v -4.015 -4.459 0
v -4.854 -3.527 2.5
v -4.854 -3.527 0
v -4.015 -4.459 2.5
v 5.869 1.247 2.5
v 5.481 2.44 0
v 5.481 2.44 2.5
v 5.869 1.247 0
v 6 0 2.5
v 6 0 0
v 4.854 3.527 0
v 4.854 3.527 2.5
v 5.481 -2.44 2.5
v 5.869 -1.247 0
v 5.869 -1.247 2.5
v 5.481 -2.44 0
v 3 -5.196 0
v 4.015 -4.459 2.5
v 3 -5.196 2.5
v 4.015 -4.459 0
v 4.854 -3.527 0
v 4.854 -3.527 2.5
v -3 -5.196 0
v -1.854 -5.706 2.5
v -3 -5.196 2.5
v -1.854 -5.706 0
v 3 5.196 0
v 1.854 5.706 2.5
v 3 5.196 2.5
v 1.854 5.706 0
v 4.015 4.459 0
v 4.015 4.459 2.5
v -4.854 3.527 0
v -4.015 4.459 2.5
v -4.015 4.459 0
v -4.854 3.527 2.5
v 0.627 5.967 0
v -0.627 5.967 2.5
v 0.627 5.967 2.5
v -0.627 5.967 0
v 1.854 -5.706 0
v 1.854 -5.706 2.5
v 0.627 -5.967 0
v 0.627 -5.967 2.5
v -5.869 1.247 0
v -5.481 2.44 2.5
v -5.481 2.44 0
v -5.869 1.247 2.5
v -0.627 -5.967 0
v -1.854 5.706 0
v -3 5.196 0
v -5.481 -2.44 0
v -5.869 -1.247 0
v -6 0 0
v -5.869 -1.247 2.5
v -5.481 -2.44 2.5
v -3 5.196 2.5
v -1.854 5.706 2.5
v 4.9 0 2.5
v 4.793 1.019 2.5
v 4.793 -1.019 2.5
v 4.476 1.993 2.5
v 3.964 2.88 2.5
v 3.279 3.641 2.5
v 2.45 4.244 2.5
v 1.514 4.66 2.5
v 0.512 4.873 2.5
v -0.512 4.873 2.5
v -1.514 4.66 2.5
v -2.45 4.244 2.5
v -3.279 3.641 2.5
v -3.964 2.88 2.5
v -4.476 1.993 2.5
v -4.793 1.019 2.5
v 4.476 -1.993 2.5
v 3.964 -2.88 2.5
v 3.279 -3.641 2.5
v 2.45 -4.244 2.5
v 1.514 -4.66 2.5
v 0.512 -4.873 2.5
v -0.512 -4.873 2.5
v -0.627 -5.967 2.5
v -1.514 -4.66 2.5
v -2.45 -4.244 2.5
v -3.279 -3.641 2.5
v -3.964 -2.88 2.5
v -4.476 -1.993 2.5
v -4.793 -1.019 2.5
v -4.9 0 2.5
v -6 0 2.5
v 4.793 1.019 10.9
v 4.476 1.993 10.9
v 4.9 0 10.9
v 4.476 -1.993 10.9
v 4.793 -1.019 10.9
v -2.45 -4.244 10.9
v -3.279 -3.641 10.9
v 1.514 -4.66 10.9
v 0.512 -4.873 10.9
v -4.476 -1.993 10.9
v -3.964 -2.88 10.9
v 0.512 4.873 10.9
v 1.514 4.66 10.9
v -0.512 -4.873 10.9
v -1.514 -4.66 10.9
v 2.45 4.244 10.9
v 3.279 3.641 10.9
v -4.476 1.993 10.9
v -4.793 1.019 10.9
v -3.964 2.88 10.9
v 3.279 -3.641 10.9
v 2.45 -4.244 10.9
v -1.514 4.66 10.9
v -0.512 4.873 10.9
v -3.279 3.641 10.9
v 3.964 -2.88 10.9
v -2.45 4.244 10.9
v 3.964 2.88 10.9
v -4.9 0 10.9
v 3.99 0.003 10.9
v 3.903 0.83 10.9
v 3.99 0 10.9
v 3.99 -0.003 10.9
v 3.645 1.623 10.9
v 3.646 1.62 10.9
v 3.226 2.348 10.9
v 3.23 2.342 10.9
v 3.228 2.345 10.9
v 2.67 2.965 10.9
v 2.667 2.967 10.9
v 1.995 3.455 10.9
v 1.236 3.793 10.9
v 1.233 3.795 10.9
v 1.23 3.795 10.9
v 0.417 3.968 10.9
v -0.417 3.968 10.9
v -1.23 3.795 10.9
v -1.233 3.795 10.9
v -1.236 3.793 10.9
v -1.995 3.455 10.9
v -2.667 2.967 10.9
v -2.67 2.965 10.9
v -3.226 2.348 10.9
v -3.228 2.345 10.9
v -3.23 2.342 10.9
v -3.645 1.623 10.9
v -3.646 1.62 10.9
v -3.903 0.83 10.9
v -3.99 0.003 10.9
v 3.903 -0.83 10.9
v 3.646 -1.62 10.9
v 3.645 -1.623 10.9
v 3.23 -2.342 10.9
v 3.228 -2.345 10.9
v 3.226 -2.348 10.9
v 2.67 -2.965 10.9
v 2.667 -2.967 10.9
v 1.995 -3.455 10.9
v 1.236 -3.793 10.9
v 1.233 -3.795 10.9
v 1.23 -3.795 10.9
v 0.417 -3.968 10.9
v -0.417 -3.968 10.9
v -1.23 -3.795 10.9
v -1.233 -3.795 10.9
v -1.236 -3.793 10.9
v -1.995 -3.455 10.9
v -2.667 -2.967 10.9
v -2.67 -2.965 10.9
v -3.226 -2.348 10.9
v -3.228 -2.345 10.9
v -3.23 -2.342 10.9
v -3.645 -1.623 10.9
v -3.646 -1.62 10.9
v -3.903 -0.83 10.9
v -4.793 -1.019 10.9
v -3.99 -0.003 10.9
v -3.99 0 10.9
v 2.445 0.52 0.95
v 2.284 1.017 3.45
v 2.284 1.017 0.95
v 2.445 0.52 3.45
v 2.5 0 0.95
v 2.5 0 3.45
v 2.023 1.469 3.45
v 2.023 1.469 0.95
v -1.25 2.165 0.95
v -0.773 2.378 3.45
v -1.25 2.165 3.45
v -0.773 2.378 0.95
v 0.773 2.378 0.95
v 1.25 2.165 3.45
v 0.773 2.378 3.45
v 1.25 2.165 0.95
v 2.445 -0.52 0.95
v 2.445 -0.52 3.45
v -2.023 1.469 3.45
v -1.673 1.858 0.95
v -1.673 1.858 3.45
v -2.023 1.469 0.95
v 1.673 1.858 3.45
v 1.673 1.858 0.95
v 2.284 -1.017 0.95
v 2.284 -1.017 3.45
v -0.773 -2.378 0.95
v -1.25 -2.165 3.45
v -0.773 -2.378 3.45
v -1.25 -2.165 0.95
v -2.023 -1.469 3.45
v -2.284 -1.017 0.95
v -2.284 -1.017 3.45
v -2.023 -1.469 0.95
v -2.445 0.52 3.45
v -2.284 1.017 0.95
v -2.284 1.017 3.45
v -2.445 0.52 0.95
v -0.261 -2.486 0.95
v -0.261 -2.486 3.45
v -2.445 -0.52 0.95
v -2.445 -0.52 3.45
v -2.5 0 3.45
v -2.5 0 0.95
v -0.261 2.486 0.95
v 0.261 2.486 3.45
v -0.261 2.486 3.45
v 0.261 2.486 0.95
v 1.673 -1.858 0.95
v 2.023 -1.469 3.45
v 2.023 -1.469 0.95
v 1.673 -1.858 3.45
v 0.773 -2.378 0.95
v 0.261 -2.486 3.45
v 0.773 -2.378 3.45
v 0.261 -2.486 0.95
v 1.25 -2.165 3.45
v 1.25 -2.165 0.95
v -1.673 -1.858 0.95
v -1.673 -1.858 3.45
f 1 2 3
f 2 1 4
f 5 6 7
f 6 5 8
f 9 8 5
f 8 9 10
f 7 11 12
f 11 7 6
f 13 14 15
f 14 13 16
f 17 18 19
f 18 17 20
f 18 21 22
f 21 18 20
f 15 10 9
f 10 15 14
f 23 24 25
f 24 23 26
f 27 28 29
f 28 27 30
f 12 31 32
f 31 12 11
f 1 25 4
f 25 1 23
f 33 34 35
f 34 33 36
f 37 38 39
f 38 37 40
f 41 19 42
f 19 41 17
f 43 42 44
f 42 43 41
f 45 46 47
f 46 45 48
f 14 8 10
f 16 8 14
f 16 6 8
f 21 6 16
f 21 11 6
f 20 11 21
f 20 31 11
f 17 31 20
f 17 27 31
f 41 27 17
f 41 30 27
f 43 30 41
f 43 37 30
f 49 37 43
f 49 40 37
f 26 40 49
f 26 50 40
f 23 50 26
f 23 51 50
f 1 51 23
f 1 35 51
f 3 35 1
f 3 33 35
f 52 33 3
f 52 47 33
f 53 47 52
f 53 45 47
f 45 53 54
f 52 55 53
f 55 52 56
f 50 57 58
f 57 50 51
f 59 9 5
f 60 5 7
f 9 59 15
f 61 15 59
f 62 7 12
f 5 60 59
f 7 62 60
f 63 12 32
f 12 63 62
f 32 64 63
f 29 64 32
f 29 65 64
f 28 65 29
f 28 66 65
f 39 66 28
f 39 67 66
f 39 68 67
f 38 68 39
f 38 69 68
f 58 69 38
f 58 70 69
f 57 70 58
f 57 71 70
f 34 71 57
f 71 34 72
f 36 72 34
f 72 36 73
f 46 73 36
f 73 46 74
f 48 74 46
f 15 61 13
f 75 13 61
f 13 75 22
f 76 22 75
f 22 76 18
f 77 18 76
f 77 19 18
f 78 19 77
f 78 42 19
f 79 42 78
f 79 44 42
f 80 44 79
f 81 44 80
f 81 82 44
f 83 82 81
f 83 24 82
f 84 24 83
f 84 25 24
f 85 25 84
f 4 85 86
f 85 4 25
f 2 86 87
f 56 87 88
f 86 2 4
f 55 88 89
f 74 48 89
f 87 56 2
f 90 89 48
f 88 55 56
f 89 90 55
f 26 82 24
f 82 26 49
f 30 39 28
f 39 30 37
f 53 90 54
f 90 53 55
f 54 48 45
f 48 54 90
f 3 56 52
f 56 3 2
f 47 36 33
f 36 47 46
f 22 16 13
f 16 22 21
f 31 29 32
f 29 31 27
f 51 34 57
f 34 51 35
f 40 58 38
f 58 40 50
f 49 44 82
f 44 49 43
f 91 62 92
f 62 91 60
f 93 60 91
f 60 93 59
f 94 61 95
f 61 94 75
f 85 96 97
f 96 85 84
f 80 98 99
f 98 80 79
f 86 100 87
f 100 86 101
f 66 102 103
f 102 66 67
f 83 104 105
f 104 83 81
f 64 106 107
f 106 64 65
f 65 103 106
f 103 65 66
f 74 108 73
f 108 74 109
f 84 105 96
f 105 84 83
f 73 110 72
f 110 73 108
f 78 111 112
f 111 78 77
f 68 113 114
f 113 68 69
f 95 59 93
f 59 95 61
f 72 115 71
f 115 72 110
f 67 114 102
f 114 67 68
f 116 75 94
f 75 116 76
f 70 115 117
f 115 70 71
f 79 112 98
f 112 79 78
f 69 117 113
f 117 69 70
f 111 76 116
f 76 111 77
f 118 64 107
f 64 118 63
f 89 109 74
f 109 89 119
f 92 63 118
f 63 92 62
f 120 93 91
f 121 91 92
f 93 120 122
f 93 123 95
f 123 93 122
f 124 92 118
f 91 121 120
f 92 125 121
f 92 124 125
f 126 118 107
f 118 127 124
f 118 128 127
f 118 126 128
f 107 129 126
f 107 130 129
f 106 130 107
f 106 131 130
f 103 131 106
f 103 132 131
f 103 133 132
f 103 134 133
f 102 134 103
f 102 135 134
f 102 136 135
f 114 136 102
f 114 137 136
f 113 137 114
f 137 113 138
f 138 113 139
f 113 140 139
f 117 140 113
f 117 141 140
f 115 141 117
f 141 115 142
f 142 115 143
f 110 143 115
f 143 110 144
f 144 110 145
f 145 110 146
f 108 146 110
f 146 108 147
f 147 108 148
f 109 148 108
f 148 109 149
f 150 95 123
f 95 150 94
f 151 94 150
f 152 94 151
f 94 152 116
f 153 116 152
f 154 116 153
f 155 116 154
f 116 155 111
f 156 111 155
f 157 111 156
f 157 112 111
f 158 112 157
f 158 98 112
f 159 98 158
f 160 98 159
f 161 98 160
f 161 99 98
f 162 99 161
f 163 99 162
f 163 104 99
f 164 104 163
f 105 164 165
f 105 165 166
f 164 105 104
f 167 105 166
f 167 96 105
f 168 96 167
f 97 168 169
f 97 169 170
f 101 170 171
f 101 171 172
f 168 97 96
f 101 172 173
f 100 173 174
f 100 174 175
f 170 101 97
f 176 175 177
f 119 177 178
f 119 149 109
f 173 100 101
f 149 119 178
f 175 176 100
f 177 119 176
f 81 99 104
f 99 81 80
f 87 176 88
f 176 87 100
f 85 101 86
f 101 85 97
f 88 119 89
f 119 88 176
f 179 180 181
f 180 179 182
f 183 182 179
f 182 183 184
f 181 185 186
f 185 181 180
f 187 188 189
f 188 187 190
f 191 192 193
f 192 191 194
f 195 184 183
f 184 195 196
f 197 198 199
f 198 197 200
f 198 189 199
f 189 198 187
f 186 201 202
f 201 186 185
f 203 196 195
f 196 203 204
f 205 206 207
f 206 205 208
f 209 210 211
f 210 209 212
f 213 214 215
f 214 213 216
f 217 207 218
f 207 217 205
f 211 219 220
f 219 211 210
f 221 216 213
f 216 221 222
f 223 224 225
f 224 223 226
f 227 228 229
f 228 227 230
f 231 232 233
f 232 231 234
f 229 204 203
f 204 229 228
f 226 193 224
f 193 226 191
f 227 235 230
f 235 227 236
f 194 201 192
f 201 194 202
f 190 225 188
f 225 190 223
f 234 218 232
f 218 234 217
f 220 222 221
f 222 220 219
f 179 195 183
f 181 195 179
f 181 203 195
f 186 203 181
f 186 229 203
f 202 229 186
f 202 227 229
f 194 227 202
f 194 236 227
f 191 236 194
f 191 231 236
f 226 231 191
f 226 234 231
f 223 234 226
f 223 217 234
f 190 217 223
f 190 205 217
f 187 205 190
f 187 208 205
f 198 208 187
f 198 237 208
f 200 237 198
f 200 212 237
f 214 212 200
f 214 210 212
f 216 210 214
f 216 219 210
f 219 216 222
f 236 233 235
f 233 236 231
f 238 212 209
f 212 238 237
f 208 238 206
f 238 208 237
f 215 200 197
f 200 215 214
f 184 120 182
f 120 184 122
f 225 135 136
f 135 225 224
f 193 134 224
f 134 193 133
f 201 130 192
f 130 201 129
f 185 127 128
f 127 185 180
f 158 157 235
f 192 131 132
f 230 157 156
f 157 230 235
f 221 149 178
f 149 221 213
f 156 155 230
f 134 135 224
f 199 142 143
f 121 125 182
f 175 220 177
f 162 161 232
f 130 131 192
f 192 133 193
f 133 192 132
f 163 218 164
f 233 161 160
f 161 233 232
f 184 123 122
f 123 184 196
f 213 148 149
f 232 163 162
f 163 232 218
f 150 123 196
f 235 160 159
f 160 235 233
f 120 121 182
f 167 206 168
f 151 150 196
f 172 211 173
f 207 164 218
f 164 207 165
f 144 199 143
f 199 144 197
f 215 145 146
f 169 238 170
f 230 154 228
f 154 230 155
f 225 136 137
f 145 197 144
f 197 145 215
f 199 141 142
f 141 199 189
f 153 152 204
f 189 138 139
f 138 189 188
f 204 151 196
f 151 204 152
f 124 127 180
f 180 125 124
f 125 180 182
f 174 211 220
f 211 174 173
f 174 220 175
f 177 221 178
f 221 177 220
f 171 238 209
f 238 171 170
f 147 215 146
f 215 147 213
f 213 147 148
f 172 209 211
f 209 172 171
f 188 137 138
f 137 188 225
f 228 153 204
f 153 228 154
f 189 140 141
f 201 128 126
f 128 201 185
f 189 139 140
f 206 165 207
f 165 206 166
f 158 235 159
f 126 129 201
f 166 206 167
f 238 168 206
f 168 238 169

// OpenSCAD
/*
 * Squeeze Bottle Cap
 *
 * by Alex Franke (CodeCreations), Nov 2012
 * http://www.theFrankes.com
 * 
 * Licenced under Creative Commons Attribution - Non-Commercial - Share Alike 3.0 
 * 
 * INSTRUCTIONS: Choose some values in the "User-defined values" section, render, and print. 
 * 
 * v1.00, Nov 21, 2012: Initial Release.
 *
 * TODO: 
 *   * Nothing at this time. 
 */

/////////////////////////////////////////////////////////////////////////////
// User-defined values... 
/////////////////////////////////////////////////////////////////////////////

lowerInnerDiameter   = 8;    // Larger diameter of cone-shaped nozzle (farthest from the tip)
lowerDiameterHeight  = 10;   // Distance from tip of previous measurement  (also insertion depth)

upperInnerDiameter   = 5;    // Smaller diameter of cone-shaped nozzle (near the tip)
upperDiameterHeight  = 2.5;  // Distance from tip of previous measurement 

capDiameter          = 12;   // Diameter of ridge at top of cap
capHeight            = 2.5;  // Height of ridge at top of cap
materialThickness    = 0.9;  // Minimum thickness of printed material

$fn                  = 30;   // Curve quality 


/////////////////////////////////////////////////////////////////////////////
// The code... 
/////////////////////////////////////////////////////////////////////////////

squeezeBottleCap(); 

/////////////////////////////////////////////////////////////////////////////
// Modules... 
/////////////////////////////////////////////////////////////////////////////

module squeezeBottleCap() {

	difference() {
		union() {
			cylinder(h=capHeight, r=capDiameter/2);
			translate([0,0,materialThickness]) 
				cylinder(h=lowerDiameterHeight, r=lowerInnerDiameter/2+materialThickness);
		}
	
		translate([0,0,materialThickness+0.05]) 
		union() {
			cylinder(r=upperInnerDiameter/2, h=upperDiameterHeight);
			translate([0,0,upperDiameterHeight]) 
				cylinder(r1=upperInnerDiameter/2, r2=lowerInnerDiameter/2, h=lowerDiameterHeight-upperDiameterHeight);
		}
	}
}
